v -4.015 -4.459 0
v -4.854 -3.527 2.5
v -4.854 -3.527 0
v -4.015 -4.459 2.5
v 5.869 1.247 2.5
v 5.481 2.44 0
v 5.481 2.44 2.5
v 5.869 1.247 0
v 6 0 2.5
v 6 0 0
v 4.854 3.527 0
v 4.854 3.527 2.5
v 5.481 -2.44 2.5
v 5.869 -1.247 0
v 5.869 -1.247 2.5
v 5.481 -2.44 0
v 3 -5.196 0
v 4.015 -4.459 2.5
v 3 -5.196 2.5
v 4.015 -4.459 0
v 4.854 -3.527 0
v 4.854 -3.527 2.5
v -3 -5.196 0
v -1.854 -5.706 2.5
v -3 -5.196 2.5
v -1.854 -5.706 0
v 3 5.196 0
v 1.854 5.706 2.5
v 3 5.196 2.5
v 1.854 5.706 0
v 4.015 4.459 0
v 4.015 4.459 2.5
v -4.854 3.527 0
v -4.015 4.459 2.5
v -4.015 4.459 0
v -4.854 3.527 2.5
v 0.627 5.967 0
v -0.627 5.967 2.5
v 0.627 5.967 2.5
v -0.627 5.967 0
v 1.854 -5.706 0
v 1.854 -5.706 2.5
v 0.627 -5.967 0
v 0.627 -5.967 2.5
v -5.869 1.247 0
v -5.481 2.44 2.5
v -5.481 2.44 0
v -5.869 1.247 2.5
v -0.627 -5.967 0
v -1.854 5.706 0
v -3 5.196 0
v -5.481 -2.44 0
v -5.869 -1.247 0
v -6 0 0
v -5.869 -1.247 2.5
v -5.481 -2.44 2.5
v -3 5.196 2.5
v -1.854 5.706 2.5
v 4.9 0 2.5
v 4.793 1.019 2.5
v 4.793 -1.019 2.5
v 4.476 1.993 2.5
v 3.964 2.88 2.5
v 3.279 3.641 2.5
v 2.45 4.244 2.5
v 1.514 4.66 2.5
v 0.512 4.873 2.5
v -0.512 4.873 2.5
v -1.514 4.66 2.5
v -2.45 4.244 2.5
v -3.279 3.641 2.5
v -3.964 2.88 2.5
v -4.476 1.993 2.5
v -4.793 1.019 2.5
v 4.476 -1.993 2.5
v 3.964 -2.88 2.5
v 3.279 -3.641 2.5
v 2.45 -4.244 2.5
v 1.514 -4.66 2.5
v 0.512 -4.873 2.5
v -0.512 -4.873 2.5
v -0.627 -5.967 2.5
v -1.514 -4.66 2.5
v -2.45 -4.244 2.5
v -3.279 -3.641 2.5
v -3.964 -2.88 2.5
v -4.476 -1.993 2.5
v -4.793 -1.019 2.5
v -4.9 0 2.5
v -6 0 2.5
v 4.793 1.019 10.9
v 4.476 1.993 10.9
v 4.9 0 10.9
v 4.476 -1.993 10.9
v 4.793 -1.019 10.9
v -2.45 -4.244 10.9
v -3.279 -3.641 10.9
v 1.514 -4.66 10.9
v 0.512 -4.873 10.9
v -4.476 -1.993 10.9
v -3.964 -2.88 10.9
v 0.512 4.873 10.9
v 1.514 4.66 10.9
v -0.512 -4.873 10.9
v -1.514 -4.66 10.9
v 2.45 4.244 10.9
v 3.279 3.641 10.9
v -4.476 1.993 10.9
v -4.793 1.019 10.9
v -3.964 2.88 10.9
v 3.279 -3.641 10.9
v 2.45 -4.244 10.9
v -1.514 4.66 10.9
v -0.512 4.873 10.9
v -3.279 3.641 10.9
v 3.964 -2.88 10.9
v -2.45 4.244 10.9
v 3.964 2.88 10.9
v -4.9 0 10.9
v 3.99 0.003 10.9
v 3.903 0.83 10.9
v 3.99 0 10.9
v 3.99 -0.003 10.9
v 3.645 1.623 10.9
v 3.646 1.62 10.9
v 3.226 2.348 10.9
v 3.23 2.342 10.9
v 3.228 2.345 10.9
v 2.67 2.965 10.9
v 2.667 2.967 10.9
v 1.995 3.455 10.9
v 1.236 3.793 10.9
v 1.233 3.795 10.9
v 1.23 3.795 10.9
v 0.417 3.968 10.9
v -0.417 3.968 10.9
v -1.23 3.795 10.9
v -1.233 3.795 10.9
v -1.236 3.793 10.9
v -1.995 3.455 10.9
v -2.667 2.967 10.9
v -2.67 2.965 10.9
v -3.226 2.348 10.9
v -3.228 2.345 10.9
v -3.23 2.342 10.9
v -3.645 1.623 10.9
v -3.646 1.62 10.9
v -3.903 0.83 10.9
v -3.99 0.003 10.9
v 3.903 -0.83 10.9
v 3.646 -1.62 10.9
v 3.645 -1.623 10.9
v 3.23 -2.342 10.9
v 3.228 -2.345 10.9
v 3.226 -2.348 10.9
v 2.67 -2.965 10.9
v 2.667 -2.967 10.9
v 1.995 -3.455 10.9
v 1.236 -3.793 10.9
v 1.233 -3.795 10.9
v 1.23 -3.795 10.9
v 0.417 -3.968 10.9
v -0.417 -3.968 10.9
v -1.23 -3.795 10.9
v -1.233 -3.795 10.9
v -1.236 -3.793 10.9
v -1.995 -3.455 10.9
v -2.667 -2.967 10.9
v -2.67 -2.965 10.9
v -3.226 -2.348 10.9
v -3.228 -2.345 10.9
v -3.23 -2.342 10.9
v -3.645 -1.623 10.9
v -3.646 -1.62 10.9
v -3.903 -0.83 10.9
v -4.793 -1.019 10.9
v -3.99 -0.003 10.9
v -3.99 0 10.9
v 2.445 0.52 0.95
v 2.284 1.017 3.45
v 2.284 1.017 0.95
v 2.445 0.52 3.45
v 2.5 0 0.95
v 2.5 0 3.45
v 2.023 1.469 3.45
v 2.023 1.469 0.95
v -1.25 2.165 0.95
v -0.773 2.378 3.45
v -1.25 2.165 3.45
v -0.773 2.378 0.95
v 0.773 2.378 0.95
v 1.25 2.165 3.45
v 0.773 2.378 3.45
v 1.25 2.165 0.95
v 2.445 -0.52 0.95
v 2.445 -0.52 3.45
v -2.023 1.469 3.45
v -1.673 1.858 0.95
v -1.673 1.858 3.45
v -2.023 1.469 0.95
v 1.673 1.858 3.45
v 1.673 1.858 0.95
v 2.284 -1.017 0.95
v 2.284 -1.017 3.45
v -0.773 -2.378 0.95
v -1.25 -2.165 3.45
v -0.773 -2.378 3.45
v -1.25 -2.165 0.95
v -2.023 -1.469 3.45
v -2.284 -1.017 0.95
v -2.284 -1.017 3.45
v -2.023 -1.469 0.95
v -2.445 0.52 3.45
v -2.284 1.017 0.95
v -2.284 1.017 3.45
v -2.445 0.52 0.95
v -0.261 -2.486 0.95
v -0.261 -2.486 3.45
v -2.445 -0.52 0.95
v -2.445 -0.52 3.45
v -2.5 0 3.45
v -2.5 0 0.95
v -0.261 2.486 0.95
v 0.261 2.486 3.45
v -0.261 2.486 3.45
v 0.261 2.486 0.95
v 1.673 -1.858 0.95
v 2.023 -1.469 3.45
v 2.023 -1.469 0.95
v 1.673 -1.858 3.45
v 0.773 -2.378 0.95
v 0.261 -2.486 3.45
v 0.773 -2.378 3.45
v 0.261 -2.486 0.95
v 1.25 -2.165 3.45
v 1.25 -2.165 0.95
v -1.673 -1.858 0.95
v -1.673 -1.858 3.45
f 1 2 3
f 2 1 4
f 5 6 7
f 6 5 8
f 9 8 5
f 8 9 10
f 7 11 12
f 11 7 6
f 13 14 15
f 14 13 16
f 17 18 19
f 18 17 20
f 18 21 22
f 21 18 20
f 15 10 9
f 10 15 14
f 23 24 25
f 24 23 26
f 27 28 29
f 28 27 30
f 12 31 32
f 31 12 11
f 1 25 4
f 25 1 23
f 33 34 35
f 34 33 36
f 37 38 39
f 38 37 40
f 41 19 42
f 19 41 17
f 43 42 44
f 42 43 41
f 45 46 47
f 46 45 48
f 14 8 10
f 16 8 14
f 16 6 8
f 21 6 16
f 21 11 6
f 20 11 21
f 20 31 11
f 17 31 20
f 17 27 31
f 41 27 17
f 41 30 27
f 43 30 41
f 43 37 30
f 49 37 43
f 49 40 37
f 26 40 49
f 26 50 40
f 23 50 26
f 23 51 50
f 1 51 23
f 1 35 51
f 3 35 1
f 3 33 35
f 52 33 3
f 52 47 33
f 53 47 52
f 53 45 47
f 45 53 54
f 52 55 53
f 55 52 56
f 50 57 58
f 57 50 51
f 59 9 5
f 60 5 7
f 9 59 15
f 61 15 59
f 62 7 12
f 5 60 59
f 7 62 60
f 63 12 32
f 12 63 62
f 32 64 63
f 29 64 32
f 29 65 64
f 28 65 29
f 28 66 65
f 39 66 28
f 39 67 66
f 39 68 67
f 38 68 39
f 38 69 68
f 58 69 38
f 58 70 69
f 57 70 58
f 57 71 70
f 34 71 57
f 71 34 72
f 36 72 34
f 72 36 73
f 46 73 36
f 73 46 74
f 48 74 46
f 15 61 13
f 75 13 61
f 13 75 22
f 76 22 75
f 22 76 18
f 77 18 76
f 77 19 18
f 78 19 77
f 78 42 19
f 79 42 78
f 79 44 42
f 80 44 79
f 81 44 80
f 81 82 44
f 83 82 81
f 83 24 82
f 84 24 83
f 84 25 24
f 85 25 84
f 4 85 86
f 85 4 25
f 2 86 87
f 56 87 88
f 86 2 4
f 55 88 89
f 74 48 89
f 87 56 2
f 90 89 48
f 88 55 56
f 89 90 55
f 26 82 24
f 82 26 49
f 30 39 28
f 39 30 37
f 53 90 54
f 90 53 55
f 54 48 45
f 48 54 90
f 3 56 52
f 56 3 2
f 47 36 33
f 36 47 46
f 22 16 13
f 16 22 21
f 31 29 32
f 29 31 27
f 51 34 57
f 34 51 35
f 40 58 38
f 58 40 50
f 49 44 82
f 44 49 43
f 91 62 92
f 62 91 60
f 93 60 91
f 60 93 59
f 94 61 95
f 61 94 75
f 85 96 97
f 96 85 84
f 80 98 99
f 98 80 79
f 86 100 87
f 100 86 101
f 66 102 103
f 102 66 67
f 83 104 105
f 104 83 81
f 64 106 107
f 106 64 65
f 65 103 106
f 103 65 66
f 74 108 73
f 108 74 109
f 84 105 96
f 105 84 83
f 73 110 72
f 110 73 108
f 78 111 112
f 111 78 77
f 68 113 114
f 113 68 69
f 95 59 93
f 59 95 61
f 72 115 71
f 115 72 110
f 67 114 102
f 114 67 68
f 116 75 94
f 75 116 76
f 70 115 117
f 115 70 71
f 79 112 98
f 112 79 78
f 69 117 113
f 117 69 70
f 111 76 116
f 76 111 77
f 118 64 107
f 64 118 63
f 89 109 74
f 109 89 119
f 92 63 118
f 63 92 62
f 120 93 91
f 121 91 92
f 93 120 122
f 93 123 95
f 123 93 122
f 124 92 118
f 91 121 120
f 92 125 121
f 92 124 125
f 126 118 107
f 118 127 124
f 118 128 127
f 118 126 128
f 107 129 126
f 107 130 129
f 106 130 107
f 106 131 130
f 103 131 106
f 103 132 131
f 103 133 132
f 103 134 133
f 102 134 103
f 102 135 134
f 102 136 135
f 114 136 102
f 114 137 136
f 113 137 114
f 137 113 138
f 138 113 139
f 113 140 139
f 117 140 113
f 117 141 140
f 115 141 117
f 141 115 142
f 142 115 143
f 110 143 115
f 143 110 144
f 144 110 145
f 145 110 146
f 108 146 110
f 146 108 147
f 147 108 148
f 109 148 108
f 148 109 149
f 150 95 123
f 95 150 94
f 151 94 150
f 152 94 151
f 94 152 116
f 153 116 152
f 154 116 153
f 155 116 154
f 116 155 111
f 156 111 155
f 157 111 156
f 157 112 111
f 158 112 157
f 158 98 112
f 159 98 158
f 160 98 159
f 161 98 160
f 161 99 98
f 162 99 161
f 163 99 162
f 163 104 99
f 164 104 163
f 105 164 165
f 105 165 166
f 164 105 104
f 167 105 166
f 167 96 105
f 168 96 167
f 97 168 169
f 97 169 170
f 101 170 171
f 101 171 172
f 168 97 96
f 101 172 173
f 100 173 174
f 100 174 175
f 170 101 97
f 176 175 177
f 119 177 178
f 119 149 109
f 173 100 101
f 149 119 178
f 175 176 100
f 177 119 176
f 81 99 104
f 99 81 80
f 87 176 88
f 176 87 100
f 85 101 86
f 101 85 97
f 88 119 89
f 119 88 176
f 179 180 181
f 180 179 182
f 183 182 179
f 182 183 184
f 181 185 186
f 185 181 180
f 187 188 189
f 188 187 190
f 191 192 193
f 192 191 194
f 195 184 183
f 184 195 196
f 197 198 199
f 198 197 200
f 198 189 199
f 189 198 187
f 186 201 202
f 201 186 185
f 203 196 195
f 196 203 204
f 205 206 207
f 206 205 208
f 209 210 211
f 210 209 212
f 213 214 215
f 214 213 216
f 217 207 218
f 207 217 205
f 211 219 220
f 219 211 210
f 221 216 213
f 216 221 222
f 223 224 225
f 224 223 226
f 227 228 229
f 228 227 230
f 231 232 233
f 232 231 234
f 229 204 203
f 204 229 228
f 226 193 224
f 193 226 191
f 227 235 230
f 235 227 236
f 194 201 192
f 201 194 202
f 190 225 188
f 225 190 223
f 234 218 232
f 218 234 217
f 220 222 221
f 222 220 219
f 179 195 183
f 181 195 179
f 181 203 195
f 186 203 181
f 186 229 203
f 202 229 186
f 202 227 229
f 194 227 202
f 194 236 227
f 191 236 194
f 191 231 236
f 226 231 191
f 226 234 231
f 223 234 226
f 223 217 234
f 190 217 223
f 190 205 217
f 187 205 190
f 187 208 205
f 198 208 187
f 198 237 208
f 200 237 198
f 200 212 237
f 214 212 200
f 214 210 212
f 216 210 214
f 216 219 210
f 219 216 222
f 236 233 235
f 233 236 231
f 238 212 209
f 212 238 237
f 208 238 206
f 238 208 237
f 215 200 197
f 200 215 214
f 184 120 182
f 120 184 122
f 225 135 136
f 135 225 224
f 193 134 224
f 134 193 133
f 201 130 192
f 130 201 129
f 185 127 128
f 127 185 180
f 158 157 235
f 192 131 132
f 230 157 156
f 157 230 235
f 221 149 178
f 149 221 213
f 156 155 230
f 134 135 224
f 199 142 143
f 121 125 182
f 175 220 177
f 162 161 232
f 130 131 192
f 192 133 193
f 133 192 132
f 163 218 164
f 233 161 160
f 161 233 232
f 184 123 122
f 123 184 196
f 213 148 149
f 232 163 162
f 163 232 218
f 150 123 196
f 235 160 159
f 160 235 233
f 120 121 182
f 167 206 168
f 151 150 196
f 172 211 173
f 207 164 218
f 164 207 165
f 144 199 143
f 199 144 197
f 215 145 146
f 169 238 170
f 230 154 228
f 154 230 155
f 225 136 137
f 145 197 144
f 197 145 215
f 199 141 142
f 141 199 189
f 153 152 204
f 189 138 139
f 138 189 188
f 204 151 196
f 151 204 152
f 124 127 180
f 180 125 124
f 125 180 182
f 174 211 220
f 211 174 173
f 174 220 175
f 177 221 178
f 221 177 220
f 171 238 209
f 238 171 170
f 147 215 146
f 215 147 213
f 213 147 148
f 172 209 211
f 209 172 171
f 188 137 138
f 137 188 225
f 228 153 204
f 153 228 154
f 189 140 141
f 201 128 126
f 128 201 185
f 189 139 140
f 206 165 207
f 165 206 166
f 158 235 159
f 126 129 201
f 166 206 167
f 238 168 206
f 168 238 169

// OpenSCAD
/*
 * Squeeze Bottle Cap
 *
 * by Alex Franke (CodeCreations), Nov 2012
 * http://www.theFrankes.com
 * 
 * Licenced under Creative Commons Attribution - Non-Commercial - Share Alike 3.0 
 * 
 * INSTRUCTIONS: Choose some values in the "User-defined values" section, render, and print. 
 * 
 * v1.00, Nov 21, 2012: Initial Release.
 *
 * TODO: 
 *   * Nothing at this time. 
 */

/////////////////////////////////////////////////////////////////////////////
// User-defined values... 
/////////////////////////////////////////////////////////////////////////////

lowerInnerDiameter   = 8;    // Larger diameter of cone-shaped nozzle (farthest from the tip)
lowerDiameterHeight  = 10;   // Distance from tip of previous measurement  (also insertion depth)

upperInnerDiameter   = 5;    // Smaller diameter of cone-shaped nozzle (near the tip)
upperDiameterHeight  = 2.5;  // Distance from tip of previous measurement 

capDiameter          = 12;   // Diameter of ridge at top of cap
capHeight            = 2.5;  // Height of ridge at top of cap
materialThickness    = 0.9;  // Minimum thickness of printed material

$fn                  = 30;   // Curve quality 


/////////////////////////////////////////////////////////////////////////////
// The code... 
/////////////////////////////////////////////////////////////////////////////

squeezeBottleCap(); 

/////////////////////////////////////////////////////////////////////////////
// Modules... 
/////////////////////////////////////////////////////////////////////////////

module squeezeBottleCap() {

	difference() {
		union() {
			cylinder(h=capHeight, r=capDiameter/2);
			translate([0,0,materialThickness]) 
				cylinder(h=lowerDiameterHeight, r=lowerInnerDiameter/2+materialThickness);
		}
	
		translate([0,0,materialThickness+0.05]) 
		union() {
			cylinder(r=upperInnerDiameter/2, h=upperDiameterHeight);
			translate([0,0,upperDiameterHeight]) 
				cylinder(r1=upperInnerDiameter/2, r2=lowerInnerDiameter/2, h=lowerDiameterHeight-upperDiameterHeight);
		}
	}
}
